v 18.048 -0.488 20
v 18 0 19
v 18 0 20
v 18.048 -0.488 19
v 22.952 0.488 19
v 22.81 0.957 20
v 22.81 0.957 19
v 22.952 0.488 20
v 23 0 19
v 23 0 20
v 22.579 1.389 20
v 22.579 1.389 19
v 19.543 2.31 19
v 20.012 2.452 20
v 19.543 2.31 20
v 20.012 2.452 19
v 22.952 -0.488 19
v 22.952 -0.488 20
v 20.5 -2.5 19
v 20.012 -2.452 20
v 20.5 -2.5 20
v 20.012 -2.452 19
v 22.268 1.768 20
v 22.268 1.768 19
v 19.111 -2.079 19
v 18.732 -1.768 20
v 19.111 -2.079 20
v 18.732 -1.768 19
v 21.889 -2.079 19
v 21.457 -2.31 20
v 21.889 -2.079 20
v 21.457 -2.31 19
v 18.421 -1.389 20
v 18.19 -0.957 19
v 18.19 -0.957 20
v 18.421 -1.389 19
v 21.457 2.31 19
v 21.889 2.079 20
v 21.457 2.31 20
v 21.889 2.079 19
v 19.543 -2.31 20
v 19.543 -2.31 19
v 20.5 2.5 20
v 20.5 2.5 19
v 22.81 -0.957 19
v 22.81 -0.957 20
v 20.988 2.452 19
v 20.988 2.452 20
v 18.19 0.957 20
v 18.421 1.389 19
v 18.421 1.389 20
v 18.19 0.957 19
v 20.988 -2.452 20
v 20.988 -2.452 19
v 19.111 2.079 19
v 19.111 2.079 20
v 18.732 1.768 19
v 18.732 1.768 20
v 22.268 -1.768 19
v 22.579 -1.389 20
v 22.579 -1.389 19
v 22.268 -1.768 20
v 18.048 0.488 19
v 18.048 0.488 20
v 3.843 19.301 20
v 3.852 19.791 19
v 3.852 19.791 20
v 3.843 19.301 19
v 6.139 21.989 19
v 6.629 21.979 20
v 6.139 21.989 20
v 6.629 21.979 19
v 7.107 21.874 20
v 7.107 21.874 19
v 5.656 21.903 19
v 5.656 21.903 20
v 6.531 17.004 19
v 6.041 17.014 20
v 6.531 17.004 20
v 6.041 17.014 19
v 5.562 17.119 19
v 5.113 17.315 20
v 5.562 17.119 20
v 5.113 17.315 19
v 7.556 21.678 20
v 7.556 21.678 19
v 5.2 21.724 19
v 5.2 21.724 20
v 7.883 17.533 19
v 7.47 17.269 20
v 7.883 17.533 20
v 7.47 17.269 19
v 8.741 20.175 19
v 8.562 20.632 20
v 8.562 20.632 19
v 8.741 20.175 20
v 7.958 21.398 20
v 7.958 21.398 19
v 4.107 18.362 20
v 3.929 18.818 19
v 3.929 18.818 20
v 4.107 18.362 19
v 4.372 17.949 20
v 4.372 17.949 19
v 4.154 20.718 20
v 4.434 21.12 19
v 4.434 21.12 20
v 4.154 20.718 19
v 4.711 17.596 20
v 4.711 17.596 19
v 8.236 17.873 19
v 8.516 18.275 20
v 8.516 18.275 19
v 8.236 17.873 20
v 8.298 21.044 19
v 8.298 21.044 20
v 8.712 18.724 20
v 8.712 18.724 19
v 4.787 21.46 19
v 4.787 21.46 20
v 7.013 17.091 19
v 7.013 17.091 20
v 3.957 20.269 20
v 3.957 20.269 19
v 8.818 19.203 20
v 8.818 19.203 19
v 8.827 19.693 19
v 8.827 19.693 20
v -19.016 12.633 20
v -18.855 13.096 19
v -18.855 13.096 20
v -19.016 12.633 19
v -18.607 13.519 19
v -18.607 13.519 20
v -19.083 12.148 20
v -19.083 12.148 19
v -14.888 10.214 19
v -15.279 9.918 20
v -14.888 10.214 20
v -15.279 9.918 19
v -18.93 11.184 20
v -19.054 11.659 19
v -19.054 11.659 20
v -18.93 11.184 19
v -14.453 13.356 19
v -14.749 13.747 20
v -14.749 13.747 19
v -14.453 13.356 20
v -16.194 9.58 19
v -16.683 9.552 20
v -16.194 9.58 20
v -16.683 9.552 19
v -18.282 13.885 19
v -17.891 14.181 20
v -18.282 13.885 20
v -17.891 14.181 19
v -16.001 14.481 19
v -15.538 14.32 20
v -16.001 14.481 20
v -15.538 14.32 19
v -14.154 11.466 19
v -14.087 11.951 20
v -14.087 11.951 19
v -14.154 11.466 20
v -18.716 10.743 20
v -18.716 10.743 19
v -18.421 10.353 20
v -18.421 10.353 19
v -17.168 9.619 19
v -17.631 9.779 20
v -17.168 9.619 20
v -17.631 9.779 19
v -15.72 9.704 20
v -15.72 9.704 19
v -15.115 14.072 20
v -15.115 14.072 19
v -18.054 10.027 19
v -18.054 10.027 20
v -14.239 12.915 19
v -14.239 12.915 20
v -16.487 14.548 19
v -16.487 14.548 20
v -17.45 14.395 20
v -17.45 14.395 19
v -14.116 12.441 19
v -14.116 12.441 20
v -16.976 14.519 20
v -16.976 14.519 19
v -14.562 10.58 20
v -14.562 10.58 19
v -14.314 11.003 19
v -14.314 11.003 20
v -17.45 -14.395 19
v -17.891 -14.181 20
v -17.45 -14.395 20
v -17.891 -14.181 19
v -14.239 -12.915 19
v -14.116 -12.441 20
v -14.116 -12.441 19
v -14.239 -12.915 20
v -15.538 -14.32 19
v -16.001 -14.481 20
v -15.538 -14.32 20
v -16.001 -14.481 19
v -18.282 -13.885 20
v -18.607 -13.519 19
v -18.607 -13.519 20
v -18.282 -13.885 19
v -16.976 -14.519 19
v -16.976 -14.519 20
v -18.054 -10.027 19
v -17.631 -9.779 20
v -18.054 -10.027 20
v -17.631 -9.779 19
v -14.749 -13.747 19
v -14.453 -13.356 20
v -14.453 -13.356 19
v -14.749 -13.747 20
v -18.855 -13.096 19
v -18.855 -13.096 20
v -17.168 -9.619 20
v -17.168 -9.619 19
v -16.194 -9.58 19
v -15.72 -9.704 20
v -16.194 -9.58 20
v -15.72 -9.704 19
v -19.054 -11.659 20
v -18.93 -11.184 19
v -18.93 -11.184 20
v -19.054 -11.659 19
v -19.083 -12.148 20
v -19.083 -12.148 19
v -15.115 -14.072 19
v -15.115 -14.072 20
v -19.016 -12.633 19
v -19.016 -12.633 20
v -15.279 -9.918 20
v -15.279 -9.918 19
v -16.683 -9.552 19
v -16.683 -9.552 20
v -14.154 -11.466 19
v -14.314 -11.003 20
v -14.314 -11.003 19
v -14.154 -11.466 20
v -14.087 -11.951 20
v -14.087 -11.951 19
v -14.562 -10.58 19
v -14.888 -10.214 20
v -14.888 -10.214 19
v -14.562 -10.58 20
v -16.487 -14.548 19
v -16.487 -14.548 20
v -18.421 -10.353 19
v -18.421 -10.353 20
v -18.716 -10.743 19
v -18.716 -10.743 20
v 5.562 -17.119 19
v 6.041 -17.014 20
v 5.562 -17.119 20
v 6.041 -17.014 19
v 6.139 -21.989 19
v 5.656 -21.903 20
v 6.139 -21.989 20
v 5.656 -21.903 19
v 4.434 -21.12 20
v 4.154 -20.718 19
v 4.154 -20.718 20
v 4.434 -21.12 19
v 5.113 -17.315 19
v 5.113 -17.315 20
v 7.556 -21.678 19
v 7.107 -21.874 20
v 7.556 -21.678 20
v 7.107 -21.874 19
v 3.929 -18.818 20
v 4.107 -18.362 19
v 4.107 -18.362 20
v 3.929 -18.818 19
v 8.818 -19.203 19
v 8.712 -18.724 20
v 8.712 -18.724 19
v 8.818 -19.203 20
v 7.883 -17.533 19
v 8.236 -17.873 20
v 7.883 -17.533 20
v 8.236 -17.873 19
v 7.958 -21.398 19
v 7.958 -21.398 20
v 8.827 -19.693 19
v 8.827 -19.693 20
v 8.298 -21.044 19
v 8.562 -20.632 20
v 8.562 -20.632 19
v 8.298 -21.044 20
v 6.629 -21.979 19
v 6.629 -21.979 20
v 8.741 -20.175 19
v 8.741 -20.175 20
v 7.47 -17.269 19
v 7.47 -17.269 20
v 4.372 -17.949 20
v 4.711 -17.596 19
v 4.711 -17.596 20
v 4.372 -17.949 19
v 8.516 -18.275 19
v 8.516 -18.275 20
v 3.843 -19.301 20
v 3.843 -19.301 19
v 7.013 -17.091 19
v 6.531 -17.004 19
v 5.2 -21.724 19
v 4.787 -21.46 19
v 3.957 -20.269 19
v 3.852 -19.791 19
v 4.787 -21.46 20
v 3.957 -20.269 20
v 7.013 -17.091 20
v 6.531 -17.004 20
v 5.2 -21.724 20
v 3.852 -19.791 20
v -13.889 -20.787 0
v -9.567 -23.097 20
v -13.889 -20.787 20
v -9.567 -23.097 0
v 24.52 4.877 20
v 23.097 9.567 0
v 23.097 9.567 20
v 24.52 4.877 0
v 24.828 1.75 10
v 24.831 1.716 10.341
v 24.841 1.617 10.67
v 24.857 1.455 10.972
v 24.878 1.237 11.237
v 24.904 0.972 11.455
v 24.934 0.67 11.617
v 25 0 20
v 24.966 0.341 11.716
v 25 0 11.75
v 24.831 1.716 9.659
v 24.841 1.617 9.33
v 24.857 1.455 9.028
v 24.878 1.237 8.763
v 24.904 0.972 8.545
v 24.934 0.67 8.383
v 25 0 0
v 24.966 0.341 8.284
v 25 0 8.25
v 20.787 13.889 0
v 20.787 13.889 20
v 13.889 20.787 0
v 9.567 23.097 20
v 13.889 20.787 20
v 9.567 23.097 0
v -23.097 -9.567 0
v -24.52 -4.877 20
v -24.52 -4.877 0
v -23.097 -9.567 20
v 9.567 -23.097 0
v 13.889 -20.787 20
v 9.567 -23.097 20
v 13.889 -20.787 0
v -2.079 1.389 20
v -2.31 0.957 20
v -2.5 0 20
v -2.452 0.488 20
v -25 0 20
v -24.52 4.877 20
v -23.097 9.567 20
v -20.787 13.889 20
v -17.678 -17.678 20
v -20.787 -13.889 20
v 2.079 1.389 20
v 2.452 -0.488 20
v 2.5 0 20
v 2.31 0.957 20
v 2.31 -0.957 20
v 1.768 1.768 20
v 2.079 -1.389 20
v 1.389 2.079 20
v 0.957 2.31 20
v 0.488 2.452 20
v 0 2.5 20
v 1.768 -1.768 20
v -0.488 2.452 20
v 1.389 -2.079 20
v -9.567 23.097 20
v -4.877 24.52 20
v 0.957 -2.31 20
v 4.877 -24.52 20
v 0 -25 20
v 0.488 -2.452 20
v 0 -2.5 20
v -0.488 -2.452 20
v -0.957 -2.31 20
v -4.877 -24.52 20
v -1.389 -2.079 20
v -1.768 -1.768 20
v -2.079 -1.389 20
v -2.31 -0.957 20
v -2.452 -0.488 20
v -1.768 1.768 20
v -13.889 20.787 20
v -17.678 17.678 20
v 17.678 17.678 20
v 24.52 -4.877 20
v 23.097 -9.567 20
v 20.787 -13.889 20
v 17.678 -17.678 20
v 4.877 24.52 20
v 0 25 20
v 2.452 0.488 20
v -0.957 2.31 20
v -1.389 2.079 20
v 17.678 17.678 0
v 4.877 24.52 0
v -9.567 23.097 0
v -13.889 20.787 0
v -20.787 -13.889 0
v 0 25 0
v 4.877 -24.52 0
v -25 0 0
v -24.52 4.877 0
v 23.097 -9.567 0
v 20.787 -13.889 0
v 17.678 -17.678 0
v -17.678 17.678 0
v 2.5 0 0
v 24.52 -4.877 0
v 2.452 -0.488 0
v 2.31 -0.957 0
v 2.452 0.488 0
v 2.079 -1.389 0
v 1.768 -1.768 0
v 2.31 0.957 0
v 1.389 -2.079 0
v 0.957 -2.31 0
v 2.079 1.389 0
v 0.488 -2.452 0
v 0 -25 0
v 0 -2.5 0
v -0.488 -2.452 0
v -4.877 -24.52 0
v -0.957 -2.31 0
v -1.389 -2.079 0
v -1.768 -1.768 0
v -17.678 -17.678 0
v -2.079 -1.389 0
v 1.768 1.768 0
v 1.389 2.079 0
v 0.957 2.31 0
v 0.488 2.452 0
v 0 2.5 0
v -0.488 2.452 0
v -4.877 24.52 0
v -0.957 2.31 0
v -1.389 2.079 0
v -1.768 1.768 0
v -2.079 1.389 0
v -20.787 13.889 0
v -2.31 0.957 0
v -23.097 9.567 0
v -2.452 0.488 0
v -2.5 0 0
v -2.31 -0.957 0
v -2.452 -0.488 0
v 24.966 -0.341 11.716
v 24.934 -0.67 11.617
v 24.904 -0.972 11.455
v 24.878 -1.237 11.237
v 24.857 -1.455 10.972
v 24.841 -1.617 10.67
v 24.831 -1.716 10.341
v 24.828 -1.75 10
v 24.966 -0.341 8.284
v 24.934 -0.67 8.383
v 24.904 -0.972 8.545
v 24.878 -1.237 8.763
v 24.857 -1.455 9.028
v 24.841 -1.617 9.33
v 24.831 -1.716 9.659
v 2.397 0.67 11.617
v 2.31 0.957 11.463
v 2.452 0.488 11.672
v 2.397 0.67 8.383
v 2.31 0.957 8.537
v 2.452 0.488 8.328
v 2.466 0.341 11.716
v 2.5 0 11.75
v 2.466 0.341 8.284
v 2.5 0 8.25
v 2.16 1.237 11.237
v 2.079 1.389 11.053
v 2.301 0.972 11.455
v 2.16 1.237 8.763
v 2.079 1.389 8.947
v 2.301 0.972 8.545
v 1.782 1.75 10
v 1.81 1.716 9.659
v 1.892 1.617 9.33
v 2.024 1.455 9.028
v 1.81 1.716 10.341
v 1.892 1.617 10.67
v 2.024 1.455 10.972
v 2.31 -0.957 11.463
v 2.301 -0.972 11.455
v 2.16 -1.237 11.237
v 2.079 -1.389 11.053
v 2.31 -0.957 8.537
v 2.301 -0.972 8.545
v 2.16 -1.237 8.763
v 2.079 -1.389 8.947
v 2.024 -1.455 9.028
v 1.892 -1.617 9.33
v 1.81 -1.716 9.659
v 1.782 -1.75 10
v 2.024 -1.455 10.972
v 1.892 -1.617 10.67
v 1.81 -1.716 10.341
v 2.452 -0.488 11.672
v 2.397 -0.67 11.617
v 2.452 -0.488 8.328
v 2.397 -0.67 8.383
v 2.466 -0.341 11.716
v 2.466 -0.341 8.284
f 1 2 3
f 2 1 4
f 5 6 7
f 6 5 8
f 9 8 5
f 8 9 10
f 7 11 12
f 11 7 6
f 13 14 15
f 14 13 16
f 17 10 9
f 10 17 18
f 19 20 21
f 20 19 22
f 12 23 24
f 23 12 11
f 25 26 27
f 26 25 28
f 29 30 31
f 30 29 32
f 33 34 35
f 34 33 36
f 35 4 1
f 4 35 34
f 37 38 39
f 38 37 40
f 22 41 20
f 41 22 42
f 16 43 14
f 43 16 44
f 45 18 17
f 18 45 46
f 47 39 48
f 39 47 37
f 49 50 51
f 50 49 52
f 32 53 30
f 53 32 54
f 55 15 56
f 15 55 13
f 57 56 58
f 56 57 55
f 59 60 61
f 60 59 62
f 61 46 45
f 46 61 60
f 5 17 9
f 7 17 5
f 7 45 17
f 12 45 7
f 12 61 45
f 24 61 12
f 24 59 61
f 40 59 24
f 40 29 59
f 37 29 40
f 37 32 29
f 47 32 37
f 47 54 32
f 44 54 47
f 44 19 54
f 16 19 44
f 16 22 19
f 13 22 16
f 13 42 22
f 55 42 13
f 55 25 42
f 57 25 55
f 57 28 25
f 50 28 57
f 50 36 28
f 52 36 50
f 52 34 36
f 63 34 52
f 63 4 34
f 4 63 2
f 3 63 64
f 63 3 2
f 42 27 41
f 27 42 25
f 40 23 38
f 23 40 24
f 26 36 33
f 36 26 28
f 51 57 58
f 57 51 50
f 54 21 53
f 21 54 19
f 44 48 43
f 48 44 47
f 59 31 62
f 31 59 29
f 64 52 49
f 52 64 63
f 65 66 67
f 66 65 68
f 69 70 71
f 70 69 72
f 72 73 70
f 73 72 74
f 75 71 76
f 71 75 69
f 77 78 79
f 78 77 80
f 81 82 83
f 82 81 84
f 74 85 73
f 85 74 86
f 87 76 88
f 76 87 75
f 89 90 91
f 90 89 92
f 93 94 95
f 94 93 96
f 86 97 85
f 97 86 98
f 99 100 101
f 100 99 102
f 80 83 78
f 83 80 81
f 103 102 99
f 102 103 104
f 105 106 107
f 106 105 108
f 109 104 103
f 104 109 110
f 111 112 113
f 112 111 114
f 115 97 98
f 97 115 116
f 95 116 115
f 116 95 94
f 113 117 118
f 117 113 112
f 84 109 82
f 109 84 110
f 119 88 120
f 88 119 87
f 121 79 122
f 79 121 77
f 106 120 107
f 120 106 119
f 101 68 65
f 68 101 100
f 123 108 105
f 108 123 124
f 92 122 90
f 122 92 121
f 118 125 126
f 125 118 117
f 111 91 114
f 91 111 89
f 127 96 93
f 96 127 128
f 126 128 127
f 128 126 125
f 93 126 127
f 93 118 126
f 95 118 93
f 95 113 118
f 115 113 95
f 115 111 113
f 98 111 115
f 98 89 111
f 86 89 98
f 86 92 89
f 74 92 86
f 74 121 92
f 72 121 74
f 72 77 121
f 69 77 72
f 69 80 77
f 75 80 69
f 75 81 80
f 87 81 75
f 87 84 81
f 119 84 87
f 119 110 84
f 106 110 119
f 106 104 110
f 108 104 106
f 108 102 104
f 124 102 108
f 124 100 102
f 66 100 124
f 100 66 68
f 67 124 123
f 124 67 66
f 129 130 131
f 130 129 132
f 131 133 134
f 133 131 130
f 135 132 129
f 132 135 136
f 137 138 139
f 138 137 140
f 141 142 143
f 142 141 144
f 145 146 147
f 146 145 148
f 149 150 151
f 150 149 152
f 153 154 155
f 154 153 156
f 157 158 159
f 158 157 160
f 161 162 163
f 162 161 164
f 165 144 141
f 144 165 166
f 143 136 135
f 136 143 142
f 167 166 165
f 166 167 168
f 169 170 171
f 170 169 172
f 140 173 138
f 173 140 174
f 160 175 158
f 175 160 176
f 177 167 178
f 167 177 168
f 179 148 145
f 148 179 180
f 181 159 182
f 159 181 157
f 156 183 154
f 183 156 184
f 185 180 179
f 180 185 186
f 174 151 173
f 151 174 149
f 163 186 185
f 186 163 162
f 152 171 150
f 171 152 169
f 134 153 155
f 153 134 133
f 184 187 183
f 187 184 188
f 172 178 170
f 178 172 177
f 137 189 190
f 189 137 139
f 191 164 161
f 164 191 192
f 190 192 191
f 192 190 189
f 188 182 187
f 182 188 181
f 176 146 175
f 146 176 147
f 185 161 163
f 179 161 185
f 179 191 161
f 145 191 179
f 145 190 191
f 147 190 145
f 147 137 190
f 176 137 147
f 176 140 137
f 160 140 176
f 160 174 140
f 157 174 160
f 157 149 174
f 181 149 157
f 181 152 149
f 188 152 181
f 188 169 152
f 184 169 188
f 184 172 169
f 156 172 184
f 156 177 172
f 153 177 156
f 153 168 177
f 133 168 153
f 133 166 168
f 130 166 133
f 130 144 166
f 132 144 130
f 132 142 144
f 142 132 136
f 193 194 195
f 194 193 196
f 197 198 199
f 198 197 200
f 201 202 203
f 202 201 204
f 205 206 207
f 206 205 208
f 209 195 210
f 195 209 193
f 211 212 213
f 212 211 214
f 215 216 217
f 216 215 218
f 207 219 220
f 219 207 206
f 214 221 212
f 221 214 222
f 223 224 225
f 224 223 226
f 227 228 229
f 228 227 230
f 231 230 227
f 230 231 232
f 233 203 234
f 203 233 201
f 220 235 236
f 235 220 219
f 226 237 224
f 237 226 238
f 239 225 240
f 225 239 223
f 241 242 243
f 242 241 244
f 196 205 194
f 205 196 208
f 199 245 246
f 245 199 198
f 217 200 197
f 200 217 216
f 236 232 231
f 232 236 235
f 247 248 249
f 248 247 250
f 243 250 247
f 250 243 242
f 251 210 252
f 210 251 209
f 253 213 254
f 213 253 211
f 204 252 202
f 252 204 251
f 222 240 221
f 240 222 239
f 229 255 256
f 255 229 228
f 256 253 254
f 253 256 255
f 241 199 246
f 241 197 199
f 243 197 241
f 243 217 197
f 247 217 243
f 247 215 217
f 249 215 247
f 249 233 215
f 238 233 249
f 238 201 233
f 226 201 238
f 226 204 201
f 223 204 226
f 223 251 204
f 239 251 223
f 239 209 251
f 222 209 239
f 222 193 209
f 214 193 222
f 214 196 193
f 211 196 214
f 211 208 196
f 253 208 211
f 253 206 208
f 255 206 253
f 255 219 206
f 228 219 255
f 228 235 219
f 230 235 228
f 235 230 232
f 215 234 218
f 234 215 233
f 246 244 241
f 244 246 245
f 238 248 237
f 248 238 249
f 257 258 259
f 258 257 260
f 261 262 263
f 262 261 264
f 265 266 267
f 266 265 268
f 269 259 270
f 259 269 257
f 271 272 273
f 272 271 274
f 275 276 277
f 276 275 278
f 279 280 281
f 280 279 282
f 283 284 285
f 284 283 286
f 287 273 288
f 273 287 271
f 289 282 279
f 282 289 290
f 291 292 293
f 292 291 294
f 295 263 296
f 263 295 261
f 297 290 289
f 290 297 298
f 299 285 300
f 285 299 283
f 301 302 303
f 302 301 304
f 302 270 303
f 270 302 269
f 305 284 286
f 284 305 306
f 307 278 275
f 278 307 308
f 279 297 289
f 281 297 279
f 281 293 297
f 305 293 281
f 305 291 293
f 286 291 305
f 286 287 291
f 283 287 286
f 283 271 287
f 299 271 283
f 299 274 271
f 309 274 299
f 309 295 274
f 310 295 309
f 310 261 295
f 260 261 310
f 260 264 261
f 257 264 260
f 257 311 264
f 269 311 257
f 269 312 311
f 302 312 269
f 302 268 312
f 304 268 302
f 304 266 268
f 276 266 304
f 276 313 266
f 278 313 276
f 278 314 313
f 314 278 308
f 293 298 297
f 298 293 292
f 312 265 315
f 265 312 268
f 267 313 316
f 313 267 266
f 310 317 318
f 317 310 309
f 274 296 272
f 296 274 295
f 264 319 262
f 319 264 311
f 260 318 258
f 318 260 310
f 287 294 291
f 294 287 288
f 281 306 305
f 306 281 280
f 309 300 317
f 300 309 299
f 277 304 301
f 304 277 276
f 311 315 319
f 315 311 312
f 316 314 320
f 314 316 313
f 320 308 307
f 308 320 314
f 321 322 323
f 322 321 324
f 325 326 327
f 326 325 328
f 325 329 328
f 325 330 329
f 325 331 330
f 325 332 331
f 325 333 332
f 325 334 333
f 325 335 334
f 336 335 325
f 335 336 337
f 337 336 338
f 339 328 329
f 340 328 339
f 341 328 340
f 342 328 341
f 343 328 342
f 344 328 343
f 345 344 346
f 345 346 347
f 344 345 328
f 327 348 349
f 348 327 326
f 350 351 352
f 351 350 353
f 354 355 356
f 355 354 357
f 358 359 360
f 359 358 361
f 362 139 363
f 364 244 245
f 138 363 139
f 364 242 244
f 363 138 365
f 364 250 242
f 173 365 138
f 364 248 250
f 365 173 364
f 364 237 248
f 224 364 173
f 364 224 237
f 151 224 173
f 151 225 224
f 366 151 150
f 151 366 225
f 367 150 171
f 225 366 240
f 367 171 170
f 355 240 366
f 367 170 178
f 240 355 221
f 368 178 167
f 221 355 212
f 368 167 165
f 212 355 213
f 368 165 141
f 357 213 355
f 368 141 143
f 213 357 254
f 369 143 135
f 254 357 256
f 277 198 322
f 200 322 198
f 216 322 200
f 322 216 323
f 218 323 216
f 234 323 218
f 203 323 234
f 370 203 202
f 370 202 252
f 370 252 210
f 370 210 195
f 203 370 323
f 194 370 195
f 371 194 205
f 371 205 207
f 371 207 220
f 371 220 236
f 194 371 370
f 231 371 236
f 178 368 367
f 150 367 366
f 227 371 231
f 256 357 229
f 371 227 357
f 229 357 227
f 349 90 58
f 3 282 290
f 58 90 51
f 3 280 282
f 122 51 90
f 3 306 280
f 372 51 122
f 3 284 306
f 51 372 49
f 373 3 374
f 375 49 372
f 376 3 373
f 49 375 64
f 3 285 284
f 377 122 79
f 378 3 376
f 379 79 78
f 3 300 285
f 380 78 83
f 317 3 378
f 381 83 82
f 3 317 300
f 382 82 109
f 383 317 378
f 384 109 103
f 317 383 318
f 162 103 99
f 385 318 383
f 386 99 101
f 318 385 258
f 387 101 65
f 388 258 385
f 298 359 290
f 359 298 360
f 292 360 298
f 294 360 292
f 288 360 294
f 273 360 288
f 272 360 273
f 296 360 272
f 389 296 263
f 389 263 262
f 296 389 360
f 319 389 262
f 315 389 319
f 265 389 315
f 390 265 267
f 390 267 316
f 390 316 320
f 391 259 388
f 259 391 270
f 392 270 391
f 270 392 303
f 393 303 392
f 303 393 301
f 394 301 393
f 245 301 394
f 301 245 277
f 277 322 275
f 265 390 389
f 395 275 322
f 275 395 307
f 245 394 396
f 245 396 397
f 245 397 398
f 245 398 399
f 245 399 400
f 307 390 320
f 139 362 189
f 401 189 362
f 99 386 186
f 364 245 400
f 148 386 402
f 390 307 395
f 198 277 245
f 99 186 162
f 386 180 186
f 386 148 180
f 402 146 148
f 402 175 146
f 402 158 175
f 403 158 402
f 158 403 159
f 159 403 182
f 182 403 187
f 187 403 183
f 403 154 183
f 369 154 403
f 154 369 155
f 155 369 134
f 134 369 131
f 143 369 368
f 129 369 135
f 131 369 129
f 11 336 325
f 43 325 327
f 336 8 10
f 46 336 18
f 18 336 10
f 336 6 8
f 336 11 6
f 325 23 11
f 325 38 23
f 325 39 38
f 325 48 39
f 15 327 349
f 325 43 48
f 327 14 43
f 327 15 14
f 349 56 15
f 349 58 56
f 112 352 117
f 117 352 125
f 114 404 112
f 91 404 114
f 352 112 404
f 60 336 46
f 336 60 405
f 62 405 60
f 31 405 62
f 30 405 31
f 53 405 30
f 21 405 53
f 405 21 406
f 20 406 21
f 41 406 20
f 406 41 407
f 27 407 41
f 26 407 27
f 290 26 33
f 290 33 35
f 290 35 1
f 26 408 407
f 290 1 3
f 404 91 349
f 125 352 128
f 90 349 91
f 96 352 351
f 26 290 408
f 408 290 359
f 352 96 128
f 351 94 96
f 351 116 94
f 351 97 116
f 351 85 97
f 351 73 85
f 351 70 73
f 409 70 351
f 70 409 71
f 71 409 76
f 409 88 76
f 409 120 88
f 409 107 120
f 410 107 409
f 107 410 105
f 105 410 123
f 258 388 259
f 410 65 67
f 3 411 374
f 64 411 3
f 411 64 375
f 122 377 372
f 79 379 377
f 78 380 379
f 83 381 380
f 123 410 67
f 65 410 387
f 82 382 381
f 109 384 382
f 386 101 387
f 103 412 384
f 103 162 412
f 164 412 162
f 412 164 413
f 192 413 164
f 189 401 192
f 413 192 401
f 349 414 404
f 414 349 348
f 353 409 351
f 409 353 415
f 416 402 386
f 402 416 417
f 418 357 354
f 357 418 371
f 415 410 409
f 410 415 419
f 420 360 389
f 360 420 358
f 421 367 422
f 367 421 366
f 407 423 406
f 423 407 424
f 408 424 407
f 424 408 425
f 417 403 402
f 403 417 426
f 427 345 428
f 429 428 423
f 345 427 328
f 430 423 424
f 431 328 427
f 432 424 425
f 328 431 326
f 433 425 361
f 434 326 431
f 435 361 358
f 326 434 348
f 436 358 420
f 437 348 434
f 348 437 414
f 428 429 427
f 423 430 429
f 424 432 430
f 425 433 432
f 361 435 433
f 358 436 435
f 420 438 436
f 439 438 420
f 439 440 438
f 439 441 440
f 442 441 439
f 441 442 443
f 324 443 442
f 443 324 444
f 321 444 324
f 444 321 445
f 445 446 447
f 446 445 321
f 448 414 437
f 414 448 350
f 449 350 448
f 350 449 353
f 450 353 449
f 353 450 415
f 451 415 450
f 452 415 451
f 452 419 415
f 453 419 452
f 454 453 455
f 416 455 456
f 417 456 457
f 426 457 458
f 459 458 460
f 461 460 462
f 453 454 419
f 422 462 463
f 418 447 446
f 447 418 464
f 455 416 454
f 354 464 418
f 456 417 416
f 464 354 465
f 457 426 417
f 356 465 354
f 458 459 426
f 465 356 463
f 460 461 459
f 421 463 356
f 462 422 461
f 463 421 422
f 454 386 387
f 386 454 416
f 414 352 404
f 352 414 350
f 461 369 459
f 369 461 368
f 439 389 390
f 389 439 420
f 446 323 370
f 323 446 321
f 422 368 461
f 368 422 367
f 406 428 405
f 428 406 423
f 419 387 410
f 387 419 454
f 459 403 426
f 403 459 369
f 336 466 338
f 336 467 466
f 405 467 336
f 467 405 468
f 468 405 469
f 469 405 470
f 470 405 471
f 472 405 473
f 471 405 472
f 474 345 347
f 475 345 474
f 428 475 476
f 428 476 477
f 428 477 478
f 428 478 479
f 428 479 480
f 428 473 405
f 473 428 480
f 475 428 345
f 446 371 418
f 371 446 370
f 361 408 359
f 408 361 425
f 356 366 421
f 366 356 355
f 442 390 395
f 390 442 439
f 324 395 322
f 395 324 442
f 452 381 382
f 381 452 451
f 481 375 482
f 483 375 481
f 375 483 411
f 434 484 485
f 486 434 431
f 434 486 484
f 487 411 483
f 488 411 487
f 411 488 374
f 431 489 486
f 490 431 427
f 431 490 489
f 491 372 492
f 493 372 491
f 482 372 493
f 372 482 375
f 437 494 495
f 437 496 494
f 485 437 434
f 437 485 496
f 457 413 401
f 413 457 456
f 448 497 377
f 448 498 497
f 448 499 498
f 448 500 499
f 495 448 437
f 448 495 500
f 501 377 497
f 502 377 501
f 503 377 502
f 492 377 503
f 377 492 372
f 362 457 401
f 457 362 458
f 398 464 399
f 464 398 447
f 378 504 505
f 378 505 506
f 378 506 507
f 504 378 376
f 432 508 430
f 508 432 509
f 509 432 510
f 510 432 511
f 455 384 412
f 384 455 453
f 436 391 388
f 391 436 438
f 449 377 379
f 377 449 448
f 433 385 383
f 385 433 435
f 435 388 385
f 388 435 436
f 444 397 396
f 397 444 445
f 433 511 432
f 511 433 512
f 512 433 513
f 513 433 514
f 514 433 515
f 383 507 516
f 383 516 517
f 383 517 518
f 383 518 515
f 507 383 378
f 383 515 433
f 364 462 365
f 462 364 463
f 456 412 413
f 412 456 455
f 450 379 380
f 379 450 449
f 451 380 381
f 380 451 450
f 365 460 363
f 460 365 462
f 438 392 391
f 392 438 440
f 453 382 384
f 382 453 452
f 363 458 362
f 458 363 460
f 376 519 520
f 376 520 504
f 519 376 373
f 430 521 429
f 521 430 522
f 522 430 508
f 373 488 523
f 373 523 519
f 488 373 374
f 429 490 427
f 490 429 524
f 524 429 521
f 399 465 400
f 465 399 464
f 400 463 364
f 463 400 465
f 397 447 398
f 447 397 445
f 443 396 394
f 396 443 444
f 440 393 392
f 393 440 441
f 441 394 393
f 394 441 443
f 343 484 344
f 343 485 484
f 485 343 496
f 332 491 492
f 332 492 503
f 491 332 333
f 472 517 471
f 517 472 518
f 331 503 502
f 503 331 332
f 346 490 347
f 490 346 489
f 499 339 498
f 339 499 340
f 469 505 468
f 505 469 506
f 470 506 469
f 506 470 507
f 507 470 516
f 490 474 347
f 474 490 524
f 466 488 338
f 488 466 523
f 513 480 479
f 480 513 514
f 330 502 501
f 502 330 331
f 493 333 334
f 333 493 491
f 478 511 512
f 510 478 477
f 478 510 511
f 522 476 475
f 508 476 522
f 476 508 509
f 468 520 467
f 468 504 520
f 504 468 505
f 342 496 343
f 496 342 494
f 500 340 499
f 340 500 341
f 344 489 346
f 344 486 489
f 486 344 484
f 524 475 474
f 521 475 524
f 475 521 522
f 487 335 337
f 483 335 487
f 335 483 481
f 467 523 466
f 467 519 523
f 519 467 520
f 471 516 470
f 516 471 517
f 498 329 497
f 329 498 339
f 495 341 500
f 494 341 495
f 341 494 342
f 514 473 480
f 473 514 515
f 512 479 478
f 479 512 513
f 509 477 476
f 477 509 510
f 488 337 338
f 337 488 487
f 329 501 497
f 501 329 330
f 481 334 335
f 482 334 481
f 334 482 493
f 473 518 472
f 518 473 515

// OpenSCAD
$fn = 32;

// ----------------------------------------------------------------------
// Control knob: dimpled knob
// ----------------------------------------------------------------------

// --- parameters (mm) ---
dimp_d = 5;               // finger dimple diameter
n_dimp = 5;               // number of dimples
dimp_r = 20.5;            // dimple ring radius
knob_d = 50;              // knob body diameter
knob_h = 20;              // knob body height
bore_d = 5;               // shaft bore diameter
set_d = 3.5;              // set screw bore diameter

dimp_step = 360 / n_dimp;  // dimple angular step

difference() {
  cylinder(h = knob_h, d = knob_d);
  translate([0, 0, -1]) cylinder(h = knob_h + 2, d = bore_d);
  translate([-1, 0, knob_h / 2]) rotate([0, 90, 0])
    cylinder(h = knob_d / 2 + bore_d / 2 + 2, d = set_d);  for (i = [0 : n_dimp - 1])
    rotate([0, 0, i * dimp_step])
      translate([dimp_r, 0, knob_h - 1])
        cylinder(h = 2, d = dimp_d);
}
